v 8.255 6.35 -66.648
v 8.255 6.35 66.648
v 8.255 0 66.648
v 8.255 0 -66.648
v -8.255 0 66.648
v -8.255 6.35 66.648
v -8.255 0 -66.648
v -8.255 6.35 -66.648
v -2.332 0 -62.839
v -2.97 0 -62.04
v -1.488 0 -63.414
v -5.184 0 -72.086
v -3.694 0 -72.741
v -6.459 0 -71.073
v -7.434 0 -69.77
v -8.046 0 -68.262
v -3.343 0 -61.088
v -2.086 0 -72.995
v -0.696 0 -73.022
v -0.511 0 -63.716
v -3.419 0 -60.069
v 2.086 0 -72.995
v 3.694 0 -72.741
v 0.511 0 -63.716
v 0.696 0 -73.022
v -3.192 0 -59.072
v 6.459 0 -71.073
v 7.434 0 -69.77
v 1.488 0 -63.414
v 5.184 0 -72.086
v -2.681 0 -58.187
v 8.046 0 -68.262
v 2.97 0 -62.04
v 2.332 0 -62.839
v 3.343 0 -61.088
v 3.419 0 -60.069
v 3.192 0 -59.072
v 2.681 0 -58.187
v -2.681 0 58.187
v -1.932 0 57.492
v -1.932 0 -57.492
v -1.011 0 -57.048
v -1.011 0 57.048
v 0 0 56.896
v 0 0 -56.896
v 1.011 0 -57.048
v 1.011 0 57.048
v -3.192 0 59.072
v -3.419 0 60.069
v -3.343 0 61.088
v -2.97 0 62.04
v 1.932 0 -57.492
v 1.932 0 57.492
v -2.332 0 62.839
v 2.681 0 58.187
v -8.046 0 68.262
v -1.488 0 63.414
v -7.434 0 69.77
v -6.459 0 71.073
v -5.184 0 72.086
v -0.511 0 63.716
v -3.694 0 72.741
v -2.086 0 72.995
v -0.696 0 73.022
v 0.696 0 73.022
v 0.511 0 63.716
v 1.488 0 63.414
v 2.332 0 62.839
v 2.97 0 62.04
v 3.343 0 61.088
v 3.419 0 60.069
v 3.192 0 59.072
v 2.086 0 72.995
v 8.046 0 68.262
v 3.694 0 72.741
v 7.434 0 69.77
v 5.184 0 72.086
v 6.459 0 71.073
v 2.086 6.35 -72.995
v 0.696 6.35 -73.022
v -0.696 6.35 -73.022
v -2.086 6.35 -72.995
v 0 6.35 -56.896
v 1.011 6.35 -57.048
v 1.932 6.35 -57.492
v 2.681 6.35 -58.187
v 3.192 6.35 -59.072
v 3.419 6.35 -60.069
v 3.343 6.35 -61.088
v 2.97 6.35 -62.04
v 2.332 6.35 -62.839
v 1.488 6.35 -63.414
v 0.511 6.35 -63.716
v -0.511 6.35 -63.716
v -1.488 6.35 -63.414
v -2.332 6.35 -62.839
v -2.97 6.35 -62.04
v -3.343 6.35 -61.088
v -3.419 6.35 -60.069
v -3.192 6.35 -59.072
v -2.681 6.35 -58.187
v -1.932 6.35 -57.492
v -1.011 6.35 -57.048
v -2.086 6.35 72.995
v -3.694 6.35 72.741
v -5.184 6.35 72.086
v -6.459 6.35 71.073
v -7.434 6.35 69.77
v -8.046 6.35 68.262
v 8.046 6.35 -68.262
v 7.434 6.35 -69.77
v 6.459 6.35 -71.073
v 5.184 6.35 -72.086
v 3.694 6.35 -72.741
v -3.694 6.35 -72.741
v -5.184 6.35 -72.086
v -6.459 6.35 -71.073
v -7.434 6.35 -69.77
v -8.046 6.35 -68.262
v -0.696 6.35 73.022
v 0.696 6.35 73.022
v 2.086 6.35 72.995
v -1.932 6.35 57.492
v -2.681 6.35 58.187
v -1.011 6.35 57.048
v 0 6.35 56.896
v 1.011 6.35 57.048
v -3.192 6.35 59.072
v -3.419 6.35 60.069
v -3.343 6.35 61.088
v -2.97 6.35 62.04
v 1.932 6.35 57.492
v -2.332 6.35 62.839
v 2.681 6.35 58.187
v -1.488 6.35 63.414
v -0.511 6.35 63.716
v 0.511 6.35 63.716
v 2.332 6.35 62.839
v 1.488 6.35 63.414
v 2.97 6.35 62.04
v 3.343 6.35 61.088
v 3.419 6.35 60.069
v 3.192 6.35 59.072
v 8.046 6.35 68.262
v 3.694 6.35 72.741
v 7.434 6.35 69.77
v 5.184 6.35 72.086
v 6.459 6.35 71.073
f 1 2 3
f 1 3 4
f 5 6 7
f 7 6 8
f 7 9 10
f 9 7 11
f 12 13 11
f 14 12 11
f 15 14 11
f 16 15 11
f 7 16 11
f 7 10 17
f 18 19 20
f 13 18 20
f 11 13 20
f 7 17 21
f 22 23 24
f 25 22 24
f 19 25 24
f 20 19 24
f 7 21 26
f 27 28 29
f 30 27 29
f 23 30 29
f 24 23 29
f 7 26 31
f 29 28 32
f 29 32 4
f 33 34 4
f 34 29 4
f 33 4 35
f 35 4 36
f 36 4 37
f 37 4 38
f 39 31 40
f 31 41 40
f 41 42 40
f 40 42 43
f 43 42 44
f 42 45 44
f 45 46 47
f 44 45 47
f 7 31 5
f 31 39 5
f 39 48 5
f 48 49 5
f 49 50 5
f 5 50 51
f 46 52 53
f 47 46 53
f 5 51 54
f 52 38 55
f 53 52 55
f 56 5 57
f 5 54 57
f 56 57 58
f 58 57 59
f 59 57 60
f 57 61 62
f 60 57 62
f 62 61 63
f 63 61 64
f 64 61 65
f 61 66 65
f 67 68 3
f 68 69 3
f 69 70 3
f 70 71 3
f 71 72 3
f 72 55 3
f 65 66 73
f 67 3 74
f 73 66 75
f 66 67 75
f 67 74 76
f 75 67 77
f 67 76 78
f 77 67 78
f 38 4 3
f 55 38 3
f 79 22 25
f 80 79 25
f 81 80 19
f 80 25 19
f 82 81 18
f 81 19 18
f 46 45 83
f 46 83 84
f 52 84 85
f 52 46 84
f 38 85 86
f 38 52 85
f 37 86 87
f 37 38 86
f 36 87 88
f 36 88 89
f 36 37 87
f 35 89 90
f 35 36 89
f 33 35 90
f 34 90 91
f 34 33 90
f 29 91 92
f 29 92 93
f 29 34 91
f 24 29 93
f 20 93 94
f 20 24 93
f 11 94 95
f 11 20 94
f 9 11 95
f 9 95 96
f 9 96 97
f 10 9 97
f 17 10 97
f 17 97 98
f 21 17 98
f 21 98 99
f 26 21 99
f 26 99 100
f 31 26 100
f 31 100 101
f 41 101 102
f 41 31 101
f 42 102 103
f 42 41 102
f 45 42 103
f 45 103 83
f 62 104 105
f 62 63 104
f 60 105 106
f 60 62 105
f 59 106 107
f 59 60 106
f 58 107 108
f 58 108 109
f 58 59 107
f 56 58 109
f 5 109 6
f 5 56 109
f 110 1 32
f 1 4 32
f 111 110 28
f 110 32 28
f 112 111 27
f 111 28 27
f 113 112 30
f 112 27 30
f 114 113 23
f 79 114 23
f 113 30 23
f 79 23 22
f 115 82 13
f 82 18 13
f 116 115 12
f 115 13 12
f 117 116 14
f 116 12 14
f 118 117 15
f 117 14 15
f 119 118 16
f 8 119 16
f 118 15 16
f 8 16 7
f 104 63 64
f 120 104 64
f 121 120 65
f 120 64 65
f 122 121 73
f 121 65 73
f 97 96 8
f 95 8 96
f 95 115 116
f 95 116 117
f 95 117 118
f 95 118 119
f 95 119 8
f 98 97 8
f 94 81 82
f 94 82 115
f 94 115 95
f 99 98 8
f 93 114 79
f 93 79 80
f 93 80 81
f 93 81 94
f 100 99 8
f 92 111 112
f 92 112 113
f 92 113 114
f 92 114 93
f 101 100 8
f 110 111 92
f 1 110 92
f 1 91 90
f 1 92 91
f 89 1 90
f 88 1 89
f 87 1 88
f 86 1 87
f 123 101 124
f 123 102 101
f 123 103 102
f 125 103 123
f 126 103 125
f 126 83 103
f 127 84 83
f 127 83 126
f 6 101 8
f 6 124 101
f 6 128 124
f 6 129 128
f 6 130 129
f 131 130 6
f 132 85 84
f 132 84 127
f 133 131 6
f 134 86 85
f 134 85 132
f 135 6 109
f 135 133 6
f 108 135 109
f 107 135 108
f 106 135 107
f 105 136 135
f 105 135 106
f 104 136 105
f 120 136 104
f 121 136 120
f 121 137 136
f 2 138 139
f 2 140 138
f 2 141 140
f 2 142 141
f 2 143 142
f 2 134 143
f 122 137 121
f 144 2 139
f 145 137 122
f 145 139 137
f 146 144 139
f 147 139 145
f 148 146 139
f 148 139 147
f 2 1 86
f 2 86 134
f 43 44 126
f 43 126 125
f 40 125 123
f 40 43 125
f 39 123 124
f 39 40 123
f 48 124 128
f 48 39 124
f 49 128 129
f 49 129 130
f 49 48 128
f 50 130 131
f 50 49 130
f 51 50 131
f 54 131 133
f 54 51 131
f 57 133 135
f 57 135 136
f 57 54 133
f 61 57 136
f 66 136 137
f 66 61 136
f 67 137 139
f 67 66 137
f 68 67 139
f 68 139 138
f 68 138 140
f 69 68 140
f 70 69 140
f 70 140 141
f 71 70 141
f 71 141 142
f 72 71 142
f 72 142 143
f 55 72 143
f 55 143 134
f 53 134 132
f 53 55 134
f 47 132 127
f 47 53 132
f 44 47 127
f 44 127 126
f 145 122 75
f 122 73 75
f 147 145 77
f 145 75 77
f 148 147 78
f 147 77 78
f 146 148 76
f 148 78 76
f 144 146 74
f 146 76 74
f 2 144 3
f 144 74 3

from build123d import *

# Parameters (mm, degrees)
SKETCH1_R           = 73.025
SKETCH1_R_2         = 3.429
BOSS_EXTRUDE1_DEPTH = 6.35
SKETCH2_W           = 64.77
SKETCH2_H           = 146.05
CUT_EXTRUDE1_DEPTH  = 104.467984179
FILLET1_R           = 6.35


with BuildPart() as part:
    # Sketch1 → Boss-Extrude1 (new body)
    with BuildSketch(Plane(origin=(0, 0, 0), x_dir=(1, 0, 0), z_dir=(0, 1, 0))):
        with Locations(Location((0, 0, 0), (0, 0, 270))):
            Circle(SKETCH1_R)
        with Locations(Location((0, 60.325, 0), (0, 0, 270))):
            Circle(SKETCH1_R_2, mode=Mode.SUBTRACT)
        with Locations(Location((0, -60.325, 0), (0, 0, 90))):
            Circle(SKETCH1_R_2, mode=Mode.SUBTRACT)
    extrude(amount=BOSS_EXTRUDE1_DEPTH)

    # Sketch2 → Cut-Extrude1 (cut, through all)
    with BuildSketch(Plane(origin=(0, 6.35, 0), x_dir=(1, 0, 0), z_dir=(0, 1, 0))):
        with Locations((40.64, 0)):
            Rectangle(SKETCH2_W, SKETCH2_H)
        with Locations((-40.64, 0)):
            Rectangle(SKETCH2_W, SKETCH2_H)
    extrude(amount=-CUT_EXTRUDE1_DEPTH, mode=Mode.SUBTRACT)

    # Fillet1
    fillet1_edges = [part.edges().sort_by_distance(p)[0] for p in [
        (-8.255, 3.175, -72.556912834),
        (-8.255, 3.175, 72.556912834),
        (8.255, 3.175, 72.556912834),
        (8.255, 3.175, -72.556912834),
    ]]
    fillet(fillet1_edges, radius=FILLET1_R)


solid = part.part
